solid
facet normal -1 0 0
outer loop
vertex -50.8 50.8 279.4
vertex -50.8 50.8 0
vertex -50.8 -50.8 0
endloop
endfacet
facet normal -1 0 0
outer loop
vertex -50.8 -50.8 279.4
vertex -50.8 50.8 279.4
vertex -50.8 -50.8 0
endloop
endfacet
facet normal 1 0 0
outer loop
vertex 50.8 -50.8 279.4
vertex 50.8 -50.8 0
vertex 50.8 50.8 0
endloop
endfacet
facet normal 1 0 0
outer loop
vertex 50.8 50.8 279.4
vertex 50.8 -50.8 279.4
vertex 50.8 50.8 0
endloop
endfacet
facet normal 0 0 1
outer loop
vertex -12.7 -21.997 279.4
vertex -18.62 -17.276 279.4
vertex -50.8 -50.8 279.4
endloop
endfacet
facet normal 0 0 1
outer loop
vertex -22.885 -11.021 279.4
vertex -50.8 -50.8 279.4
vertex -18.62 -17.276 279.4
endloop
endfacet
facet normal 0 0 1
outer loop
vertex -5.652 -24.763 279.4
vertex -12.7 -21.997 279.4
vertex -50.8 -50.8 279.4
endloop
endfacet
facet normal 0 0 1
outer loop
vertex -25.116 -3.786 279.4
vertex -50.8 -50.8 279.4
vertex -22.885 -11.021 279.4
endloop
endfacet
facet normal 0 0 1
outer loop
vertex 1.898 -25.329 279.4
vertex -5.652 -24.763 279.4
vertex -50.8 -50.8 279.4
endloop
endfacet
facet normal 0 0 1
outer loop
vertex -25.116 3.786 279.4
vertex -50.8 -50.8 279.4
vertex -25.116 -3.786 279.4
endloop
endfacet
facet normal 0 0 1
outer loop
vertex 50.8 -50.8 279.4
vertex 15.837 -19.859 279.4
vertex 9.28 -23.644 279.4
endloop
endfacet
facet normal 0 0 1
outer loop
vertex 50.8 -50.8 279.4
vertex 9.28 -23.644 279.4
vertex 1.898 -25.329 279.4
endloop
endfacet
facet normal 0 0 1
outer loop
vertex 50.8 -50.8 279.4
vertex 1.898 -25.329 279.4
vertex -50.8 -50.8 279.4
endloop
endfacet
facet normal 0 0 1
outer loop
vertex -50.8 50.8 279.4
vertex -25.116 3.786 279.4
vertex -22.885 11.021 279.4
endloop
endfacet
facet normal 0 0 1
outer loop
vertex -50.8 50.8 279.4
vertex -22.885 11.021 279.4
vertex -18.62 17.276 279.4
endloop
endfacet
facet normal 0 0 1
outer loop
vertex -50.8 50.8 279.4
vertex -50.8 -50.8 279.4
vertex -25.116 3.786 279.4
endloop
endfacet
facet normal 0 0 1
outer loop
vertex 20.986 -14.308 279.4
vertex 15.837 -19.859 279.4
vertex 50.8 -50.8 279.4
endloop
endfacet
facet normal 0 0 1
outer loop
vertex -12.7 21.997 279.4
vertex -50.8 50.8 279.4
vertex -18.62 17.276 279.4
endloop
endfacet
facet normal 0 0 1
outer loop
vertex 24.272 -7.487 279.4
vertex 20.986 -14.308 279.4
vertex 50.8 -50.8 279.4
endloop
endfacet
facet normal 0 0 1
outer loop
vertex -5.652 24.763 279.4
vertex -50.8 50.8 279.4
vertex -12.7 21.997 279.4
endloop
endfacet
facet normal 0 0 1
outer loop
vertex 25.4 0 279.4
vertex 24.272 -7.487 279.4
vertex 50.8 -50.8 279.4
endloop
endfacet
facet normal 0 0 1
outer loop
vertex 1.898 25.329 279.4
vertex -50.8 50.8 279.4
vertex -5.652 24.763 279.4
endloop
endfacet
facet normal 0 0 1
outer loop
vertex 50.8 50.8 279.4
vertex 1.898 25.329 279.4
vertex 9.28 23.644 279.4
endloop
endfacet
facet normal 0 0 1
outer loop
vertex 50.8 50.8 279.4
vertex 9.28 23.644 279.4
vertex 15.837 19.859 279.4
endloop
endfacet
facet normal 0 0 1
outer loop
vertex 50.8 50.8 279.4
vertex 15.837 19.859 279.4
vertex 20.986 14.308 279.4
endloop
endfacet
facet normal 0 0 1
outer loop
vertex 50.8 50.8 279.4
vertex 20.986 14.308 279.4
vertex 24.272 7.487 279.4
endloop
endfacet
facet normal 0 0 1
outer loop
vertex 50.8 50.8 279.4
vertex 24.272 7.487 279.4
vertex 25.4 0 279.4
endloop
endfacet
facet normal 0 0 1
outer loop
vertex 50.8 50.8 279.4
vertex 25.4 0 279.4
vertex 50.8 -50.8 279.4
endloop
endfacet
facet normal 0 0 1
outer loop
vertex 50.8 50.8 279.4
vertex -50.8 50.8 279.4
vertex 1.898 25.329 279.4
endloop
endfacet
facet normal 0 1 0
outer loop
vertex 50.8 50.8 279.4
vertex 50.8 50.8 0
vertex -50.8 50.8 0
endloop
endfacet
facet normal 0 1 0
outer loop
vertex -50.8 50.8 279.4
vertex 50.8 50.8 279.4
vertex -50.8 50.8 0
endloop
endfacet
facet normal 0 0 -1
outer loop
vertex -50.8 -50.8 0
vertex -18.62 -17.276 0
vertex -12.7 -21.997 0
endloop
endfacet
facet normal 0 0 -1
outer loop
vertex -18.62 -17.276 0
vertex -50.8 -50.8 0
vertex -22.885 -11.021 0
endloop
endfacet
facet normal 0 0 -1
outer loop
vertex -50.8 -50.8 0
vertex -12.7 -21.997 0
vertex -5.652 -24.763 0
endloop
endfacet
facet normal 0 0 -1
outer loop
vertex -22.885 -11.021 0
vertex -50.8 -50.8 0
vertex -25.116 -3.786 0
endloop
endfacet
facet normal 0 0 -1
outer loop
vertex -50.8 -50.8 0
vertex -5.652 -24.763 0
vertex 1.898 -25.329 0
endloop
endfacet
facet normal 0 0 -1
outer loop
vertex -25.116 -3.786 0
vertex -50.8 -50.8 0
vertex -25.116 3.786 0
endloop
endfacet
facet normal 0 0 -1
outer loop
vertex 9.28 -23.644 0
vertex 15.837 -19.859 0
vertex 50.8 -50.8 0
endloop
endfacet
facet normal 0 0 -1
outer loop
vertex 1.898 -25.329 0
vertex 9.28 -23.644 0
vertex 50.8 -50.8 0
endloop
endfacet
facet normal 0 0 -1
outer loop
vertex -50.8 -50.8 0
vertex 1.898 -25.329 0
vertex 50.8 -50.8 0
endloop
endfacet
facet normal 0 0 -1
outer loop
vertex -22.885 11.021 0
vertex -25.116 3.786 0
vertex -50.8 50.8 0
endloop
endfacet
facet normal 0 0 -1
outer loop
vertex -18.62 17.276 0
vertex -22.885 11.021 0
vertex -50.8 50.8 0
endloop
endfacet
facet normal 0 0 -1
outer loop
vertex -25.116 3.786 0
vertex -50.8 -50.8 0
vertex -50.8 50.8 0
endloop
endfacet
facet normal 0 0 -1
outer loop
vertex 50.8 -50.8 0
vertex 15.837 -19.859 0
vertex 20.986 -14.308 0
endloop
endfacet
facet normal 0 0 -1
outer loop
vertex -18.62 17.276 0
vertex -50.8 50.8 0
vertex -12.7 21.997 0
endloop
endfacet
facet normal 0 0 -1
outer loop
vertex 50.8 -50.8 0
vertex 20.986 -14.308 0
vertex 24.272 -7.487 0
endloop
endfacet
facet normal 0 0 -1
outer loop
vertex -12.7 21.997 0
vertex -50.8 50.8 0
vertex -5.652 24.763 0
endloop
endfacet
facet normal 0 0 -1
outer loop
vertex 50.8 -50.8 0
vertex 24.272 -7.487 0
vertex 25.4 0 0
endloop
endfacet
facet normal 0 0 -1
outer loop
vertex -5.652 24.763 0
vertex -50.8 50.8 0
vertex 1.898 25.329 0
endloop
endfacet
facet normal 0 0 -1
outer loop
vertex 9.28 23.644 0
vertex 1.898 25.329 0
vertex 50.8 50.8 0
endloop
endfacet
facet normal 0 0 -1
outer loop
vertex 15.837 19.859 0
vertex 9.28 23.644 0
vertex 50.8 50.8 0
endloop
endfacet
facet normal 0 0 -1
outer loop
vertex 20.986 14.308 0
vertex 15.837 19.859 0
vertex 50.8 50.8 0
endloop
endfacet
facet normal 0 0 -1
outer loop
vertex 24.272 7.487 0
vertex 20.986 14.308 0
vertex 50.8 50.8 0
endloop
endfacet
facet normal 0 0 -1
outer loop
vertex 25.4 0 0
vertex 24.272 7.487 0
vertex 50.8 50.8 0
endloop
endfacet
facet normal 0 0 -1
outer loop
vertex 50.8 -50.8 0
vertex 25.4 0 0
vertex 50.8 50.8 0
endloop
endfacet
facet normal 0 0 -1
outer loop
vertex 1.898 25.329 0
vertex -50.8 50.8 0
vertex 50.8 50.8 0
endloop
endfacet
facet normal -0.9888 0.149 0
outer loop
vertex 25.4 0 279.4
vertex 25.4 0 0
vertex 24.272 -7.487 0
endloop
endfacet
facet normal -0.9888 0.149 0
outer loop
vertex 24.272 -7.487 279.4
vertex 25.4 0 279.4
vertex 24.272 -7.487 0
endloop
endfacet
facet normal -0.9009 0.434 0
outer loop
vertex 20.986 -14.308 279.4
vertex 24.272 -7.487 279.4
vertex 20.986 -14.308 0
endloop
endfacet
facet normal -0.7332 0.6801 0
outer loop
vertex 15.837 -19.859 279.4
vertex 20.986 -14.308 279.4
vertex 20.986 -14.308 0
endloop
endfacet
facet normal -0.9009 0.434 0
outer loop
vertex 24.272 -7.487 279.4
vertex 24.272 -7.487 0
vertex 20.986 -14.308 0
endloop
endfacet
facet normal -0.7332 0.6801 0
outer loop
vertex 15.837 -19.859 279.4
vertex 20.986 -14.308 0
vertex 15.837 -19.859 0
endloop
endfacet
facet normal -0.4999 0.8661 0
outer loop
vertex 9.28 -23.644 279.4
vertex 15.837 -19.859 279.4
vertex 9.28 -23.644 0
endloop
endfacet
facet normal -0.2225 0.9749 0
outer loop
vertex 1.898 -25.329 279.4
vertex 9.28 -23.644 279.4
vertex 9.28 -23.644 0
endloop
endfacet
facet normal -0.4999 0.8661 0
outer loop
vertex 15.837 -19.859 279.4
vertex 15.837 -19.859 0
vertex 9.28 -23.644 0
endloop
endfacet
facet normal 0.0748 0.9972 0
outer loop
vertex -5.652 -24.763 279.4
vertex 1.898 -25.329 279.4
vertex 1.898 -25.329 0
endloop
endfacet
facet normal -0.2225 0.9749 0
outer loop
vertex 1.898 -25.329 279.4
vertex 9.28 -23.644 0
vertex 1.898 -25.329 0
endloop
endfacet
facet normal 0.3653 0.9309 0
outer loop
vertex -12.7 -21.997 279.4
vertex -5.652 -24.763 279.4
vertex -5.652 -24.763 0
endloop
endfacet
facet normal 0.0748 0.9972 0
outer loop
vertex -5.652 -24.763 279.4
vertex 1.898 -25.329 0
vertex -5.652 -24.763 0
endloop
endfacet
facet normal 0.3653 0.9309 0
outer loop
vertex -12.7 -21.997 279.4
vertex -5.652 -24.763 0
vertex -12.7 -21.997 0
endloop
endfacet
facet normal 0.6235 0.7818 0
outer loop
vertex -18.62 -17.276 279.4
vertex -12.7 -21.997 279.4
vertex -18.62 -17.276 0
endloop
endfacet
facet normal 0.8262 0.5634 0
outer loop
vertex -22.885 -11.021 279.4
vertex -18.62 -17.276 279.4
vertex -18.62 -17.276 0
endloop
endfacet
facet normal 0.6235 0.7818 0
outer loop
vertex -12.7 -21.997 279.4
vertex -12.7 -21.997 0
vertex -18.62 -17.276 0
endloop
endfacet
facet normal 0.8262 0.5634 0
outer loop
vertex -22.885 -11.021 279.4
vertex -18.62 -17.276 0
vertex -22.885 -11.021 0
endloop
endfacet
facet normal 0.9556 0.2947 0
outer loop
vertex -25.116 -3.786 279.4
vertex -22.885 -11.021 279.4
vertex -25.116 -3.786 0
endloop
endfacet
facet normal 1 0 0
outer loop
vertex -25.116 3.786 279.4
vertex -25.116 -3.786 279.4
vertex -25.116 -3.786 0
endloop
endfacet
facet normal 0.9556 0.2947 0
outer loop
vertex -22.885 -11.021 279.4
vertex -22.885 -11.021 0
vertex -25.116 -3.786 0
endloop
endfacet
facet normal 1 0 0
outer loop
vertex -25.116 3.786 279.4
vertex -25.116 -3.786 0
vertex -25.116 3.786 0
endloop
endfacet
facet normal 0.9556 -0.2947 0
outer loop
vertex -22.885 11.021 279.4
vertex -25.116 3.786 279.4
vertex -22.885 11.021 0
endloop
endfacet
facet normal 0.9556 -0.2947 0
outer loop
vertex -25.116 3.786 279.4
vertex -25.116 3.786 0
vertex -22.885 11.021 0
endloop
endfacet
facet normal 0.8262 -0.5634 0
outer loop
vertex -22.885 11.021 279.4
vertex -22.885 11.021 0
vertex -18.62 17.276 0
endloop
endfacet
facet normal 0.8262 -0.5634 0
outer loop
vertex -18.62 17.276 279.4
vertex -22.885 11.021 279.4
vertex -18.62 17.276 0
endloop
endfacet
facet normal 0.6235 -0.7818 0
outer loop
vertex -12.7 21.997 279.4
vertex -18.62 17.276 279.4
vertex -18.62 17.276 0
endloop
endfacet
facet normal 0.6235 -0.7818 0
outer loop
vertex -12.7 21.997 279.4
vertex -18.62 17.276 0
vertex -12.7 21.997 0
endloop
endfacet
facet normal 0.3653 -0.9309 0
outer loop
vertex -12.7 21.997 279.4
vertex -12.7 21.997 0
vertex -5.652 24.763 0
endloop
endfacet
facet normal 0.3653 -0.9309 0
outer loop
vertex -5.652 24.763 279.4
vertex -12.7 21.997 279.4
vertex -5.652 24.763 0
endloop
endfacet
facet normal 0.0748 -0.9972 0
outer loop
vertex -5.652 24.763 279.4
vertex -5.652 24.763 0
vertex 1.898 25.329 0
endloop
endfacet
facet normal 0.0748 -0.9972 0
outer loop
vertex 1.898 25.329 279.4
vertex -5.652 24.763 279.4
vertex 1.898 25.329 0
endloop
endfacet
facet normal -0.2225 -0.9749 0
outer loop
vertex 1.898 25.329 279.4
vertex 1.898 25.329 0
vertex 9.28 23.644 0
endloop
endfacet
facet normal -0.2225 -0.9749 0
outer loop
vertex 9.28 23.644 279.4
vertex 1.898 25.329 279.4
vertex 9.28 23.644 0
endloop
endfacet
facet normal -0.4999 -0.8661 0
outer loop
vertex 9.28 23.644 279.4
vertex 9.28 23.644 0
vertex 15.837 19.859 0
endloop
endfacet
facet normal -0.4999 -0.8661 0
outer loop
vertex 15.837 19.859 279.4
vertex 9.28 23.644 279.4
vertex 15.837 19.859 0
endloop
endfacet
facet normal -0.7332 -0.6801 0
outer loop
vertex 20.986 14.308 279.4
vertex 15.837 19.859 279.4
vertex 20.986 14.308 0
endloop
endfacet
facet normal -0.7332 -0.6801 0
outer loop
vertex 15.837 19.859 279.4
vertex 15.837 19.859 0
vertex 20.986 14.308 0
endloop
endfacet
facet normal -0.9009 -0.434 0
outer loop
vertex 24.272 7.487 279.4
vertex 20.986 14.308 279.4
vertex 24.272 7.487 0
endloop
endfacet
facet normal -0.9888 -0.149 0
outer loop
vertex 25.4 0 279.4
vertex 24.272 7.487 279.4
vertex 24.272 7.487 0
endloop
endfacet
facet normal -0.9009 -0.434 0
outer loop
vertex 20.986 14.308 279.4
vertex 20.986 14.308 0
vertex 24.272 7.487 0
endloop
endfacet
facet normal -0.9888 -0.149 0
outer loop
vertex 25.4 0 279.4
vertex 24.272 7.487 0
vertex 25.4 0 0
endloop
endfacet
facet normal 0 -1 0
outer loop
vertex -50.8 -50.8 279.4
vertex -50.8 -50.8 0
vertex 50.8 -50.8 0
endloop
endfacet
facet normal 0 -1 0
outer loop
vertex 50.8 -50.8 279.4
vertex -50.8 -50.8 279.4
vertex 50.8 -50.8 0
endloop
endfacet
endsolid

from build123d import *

# Parameters (mm, degrees)
F1_DEPTH = 279.4


with BuildPart() as f1:
    # F0 (on Top) → F1 (new body)
    with BuildSketch(Plane.XY):
        with BuildLine():
            ThreePointArc((-25.4, 0), (0, 25.4), (25.4, 0))
            Line((25.4, 0), (50.8, 0))
            Line((50.8, 0), (50.8, 50.8))
            Line((50.8, 50.8), (-50.8, 50.8))
            Line((-50.8, 50.8), (-50.8, 0))
            Line((-50.8, 0), (-25.4, 0))
        make_face()
        with BuildLine():
            Line((50.8, 0), (25.4, 0))
            ThreePointArc((25.4, 0), (0, -25.4), (-25.4, 0))
            Line((-25.4, 0), (-50.8, 0))
            Line((-50.8, 0), (-50.8, -50.8))
            Line((-50.8, -50.8), (50.8, -50.8))
            Line((50.8, -50.8), (50.8, 0))
        make_face()
    extrude(amount=F1_DEPTH)


solid = f1.part
